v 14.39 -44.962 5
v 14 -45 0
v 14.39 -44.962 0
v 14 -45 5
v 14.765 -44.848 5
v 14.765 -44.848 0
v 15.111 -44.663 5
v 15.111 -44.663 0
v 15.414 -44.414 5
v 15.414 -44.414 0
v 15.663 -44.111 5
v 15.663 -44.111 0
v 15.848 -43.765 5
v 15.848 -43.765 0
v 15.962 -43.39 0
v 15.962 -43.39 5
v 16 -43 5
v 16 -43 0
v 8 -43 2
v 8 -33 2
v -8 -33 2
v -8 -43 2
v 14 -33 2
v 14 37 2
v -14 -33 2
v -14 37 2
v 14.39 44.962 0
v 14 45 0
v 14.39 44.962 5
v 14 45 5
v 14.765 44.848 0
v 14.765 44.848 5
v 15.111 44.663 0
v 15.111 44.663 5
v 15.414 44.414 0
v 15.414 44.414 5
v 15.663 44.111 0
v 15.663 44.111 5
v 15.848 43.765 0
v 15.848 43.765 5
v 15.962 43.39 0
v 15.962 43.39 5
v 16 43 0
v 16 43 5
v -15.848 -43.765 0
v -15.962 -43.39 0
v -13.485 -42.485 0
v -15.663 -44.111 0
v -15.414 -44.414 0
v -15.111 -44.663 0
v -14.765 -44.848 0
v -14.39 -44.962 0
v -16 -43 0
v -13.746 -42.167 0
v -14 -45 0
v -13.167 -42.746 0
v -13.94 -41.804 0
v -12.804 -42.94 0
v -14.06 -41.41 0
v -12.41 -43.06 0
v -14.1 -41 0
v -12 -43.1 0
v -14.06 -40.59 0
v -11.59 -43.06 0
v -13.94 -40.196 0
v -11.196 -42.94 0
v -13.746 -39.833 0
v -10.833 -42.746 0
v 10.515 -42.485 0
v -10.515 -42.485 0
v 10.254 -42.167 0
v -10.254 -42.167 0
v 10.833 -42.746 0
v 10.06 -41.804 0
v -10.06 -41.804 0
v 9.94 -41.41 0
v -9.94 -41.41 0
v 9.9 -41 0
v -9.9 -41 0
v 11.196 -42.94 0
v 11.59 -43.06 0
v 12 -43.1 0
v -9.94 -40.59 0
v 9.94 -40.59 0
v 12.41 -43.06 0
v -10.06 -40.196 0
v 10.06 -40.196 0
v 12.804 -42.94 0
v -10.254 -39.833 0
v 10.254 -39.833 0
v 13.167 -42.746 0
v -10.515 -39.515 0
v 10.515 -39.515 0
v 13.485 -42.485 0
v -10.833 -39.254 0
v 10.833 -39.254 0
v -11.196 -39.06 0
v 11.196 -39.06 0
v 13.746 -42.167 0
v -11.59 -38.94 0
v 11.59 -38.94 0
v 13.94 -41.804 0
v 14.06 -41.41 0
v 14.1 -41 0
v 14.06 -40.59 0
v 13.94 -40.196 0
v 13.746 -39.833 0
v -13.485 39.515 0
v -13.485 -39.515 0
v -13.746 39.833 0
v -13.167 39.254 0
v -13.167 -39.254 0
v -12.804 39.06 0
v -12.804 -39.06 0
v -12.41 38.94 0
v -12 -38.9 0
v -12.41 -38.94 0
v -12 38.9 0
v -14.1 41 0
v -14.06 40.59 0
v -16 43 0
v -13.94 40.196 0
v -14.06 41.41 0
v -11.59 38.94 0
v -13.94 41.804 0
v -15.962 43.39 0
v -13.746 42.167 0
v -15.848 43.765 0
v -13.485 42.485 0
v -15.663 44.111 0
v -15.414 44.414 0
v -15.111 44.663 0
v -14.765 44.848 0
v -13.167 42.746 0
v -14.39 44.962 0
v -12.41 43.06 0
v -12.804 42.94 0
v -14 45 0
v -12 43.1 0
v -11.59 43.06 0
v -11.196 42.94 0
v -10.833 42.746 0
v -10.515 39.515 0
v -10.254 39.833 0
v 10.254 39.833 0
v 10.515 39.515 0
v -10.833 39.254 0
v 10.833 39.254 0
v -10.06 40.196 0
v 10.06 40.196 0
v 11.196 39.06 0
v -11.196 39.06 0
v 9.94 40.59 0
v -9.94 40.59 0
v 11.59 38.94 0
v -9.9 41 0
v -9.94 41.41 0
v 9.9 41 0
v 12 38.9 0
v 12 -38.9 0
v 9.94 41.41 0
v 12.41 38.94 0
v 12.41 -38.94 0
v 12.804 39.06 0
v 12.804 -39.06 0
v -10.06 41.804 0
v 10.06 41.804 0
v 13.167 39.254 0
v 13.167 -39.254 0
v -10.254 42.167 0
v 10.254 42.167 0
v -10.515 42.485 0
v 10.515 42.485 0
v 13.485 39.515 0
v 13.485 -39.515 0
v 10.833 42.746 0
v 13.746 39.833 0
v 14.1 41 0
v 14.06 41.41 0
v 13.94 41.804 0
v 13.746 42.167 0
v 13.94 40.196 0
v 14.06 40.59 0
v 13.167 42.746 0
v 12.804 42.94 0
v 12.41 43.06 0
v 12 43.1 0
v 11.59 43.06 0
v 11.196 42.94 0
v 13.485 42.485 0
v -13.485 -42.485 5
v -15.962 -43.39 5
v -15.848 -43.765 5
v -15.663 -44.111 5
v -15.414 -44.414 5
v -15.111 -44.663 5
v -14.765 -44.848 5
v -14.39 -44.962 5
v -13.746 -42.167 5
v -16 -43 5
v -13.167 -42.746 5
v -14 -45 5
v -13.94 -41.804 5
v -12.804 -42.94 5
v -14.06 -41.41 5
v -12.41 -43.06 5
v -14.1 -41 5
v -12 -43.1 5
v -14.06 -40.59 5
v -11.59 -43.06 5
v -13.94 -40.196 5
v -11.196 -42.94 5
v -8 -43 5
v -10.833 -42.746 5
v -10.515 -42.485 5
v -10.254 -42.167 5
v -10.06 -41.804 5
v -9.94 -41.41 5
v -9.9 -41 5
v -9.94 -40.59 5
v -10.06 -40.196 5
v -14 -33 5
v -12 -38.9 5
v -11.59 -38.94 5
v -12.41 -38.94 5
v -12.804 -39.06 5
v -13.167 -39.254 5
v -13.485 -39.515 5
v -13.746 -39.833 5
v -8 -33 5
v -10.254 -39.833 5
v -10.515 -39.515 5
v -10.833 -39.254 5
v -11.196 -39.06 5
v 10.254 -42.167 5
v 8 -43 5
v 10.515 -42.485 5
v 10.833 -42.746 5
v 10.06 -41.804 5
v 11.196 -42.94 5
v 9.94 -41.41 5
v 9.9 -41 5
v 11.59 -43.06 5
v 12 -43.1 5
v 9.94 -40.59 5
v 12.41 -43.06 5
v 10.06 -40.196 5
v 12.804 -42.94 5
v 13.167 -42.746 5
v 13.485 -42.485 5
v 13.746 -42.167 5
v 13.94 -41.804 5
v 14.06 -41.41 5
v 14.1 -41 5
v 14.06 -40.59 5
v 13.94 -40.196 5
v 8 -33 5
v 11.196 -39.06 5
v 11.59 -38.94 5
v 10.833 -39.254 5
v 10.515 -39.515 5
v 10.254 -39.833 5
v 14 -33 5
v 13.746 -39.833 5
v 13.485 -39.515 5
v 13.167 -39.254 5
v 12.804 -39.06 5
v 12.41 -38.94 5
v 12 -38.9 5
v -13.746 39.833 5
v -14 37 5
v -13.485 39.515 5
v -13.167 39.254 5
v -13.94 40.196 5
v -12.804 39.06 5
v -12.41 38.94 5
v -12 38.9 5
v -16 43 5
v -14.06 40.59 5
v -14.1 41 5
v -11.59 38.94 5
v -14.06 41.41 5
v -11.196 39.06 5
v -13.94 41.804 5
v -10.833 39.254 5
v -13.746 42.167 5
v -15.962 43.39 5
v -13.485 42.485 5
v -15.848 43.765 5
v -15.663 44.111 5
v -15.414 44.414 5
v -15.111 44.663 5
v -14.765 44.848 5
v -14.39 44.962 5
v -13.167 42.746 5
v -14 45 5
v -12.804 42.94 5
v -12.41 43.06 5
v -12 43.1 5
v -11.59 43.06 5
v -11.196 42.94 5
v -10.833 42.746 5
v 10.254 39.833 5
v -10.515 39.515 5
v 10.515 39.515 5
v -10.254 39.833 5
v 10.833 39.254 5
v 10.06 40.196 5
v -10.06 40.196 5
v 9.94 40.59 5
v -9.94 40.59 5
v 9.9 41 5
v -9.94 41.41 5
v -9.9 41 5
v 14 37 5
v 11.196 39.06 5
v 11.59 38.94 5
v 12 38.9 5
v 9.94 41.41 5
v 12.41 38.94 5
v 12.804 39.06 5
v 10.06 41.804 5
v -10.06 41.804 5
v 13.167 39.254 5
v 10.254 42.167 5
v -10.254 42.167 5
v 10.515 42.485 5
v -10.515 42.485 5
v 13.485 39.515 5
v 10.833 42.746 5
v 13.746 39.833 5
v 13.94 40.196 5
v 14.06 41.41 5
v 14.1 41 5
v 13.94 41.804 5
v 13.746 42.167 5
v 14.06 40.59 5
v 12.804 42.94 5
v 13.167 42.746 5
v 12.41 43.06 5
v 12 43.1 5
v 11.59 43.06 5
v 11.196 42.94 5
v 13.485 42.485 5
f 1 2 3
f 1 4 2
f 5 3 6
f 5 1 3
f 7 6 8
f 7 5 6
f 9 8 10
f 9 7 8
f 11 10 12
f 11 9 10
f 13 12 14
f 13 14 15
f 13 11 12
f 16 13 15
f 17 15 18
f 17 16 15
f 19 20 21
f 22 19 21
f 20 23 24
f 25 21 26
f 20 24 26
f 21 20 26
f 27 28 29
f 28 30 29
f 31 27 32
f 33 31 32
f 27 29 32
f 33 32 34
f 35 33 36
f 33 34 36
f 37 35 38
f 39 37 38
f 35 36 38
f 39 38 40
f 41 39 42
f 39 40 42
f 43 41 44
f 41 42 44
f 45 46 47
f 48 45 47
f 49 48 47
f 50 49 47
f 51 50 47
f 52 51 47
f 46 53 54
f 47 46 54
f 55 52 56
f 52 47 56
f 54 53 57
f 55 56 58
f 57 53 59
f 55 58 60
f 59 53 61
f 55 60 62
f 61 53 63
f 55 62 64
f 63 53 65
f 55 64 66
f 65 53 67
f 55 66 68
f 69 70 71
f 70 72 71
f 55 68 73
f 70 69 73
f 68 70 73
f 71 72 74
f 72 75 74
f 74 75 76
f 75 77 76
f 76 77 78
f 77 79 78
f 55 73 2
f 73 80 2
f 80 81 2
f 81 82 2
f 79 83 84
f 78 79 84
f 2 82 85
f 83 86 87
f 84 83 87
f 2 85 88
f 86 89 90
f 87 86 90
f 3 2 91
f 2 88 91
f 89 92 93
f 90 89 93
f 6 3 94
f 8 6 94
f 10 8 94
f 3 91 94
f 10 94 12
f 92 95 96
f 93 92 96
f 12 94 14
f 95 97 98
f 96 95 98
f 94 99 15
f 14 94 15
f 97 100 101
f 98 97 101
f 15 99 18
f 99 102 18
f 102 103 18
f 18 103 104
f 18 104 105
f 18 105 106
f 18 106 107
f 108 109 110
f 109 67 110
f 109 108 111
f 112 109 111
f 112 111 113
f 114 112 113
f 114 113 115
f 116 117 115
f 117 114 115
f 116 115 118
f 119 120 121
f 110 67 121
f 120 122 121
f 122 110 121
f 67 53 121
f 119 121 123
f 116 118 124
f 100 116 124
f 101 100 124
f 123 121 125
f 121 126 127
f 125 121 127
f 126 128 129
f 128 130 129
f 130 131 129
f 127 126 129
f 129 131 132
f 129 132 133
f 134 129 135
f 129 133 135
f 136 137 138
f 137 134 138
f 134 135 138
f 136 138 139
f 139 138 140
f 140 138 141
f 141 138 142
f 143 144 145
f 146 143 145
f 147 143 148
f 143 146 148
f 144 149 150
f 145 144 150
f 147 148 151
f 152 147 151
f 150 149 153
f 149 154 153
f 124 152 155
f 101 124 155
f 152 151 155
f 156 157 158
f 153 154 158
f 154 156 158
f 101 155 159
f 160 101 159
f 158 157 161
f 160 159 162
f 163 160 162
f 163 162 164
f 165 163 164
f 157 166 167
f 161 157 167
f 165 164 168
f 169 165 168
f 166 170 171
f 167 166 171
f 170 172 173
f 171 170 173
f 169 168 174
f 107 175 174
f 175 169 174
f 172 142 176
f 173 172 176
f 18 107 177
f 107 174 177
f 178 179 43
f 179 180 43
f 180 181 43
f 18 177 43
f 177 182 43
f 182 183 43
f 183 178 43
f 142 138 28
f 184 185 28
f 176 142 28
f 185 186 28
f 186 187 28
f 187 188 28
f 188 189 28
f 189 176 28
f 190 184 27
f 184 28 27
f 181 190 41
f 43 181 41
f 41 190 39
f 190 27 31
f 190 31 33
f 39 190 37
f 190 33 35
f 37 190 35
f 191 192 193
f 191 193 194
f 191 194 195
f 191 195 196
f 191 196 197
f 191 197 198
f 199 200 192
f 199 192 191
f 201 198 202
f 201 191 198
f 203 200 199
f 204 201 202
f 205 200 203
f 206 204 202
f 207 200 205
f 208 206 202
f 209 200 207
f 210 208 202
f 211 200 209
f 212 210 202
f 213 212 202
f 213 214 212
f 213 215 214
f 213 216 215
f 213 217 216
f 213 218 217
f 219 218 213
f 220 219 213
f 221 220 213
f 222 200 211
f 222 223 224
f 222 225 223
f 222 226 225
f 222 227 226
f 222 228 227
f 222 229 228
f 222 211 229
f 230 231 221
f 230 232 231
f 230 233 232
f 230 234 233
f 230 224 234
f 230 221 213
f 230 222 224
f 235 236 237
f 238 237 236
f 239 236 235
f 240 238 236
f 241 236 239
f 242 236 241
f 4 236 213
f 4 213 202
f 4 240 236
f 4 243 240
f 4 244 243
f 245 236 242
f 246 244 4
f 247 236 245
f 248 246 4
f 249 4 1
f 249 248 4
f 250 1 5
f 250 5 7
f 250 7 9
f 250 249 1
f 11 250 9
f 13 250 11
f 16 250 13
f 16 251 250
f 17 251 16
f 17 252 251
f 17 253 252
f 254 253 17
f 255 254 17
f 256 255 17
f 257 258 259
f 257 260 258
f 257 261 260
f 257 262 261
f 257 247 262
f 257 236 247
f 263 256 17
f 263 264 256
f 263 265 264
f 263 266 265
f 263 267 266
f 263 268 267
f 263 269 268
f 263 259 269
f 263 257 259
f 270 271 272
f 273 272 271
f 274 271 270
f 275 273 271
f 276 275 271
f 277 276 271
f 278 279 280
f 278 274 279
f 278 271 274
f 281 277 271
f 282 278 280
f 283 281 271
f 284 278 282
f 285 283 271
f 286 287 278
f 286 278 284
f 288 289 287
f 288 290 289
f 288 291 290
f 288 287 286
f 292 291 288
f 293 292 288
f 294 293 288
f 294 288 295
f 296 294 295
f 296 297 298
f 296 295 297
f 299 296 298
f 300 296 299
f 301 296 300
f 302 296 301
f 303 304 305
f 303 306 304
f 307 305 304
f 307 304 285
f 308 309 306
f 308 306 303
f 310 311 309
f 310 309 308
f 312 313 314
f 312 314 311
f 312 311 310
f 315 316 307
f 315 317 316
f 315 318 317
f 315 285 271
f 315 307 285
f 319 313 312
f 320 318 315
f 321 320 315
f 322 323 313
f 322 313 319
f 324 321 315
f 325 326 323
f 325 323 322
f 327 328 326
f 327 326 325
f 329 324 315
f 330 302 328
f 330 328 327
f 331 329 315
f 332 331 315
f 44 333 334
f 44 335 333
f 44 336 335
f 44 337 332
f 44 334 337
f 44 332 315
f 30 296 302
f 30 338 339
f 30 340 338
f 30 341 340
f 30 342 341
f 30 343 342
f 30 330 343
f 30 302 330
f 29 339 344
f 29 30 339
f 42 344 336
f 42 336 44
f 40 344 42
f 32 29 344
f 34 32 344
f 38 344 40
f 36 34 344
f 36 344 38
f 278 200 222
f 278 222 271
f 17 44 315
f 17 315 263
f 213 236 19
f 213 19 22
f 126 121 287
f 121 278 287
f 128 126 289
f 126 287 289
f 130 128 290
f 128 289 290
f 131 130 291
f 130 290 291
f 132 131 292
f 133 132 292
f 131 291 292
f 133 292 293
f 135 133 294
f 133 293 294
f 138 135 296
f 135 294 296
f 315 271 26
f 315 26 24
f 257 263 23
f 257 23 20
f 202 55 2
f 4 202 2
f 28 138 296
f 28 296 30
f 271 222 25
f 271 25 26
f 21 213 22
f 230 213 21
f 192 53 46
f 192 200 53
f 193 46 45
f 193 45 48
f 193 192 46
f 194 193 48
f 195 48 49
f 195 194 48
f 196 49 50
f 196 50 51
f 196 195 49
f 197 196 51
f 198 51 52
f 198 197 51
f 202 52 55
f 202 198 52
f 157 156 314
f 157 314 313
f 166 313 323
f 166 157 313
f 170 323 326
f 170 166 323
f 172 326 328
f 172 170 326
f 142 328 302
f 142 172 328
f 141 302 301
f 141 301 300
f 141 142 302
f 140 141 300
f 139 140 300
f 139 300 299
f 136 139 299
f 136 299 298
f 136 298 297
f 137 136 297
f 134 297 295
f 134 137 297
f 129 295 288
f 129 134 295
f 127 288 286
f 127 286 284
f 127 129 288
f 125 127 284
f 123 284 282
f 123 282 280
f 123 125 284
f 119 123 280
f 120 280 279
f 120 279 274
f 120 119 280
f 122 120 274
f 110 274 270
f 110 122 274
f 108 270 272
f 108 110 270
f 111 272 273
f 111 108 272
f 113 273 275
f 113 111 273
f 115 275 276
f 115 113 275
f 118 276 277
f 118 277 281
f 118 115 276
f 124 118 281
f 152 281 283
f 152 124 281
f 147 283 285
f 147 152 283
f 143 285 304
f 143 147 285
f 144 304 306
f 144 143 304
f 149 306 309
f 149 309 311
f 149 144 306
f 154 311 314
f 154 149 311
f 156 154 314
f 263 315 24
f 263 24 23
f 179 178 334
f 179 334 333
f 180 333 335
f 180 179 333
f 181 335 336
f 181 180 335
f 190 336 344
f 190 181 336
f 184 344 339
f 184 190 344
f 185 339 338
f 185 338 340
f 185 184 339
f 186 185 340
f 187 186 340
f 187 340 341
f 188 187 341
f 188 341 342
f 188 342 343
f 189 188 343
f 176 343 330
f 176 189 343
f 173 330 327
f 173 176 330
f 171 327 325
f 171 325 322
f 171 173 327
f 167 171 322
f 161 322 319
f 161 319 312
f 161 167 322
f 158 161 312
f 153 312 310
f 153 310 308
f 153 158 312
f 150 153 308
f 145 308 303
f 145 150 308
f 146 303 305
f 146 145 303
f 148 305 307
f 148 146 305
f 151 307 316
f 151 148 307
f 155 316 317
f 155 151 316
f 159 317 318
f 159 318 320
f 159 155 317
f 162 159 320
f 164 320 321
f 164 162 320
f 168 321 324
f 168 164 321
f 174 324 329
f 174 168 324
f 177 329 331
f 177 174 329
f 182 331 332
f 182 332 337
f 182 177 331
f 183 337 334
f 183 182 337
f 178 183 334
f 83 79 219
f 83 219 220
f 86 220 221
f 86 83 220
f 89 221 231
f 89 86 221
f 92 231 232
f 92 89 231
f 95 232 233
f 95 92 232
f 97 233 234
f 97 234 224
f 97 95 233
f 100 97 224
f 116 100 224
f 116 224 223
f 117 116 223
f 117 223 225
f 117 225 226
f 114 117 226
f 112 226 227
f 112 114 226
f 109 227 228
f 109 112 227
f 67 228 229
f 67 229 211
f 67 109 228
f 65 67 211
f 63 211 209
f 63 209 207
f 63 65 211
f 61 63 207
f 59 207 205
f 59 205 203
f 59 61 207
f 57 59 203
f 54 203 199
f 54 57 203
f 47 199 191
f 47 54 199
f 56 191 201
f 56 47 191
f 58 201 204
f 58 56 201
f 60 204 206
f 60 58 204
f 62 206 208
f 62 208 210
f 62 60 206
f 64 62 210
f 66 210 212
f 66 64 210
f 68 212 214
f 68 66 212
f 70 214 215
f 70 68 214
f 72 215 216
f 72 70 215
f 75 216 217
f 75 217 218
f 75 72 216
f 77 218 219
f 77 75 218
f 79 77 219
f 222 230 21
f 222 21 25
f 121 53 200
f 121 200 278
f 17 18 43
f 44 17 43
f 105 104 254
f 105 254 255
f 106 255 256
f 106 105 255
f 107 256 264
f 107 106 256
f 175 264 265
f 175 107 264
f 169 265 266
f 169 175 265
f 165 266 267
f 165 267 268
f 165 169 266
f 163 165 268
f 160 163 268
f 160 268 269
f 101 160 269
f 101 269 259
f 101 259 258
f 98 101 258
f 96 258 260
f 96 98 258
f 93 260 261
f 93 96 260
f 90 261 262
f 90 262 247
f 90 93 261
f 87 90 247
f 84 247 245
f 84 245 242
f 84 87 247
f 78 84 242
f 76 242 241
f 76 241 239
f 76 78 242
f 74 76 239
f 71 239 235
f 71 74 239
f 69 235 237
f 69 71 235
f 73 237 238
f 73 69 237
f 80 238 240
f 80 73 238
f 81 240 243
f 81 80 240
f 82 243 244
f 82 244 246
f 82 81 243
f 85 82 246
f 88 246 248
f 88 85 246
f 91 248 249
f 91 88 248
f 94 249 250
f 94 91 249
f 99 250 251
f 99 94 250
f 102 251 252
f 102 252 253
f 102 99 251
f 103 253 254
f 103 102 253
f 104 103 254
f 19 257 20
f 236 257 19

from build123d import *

# Parameters (mm, degrees)
EXTRUDE001_DEPTH = 3
SKETCH_W         = 32
SKETCH_H         = 90
SKETCH_R         = 2.1
EXTRUDE_DEPTH    = 5
FILLET_R         = 2


with BuildPart() as extrude001:
    # Sketch001 (on Face5 of Fillet) → Extrude001 (new body)
    with BuildSketch(Plane.XY.offset(5)):
        Polygon((14, 37), (14, -33), (8, -33), (8, -43), (-8, -43), (-8, -33), (-14, -33), (-14, 37), align=None)
    extrude(amount=-EXTRUDE001_DEPTH)


with BuildPart() as cut:
    # Sketch → Extrude (new body)
    with BuildSketch(Plane.XY):
        Rectangle(SKETCH_W, SKETCH_H)
        with Locations((-12, 41)):
            Circle(SKETCH_R, mode=Mode.SUBTRACT)
        with Locations((12, 41)):
            Circle(SKETCH_R, mode=Mode.SUBTRACT)
        with Locations((-12, -41)):
            Circle(SKETCH_R, mode=Mode.SUBTRACT)
        with Locations((12, -41)):
            Circle(SKETCH_R, mode=Mode.SUBTRACT)
    extrude(amount=EXTRUDE_DEPTH)

    # Fillet
    fillet_edges = [cut.edges().sort_by_distance(p)[0] for p in [
        (-16, 45, 2.5),
        (16, 45, 2.5),
        (16, -45, 2.5),
        (-16, -45, 2.5),
    ]]
    fillet(fillet_edges, radius=FILLET_R)

    # Cut: cut Extrude001
    add(extrude001.part, mode=Mode.SUBTRACT)


solid = cut.part
